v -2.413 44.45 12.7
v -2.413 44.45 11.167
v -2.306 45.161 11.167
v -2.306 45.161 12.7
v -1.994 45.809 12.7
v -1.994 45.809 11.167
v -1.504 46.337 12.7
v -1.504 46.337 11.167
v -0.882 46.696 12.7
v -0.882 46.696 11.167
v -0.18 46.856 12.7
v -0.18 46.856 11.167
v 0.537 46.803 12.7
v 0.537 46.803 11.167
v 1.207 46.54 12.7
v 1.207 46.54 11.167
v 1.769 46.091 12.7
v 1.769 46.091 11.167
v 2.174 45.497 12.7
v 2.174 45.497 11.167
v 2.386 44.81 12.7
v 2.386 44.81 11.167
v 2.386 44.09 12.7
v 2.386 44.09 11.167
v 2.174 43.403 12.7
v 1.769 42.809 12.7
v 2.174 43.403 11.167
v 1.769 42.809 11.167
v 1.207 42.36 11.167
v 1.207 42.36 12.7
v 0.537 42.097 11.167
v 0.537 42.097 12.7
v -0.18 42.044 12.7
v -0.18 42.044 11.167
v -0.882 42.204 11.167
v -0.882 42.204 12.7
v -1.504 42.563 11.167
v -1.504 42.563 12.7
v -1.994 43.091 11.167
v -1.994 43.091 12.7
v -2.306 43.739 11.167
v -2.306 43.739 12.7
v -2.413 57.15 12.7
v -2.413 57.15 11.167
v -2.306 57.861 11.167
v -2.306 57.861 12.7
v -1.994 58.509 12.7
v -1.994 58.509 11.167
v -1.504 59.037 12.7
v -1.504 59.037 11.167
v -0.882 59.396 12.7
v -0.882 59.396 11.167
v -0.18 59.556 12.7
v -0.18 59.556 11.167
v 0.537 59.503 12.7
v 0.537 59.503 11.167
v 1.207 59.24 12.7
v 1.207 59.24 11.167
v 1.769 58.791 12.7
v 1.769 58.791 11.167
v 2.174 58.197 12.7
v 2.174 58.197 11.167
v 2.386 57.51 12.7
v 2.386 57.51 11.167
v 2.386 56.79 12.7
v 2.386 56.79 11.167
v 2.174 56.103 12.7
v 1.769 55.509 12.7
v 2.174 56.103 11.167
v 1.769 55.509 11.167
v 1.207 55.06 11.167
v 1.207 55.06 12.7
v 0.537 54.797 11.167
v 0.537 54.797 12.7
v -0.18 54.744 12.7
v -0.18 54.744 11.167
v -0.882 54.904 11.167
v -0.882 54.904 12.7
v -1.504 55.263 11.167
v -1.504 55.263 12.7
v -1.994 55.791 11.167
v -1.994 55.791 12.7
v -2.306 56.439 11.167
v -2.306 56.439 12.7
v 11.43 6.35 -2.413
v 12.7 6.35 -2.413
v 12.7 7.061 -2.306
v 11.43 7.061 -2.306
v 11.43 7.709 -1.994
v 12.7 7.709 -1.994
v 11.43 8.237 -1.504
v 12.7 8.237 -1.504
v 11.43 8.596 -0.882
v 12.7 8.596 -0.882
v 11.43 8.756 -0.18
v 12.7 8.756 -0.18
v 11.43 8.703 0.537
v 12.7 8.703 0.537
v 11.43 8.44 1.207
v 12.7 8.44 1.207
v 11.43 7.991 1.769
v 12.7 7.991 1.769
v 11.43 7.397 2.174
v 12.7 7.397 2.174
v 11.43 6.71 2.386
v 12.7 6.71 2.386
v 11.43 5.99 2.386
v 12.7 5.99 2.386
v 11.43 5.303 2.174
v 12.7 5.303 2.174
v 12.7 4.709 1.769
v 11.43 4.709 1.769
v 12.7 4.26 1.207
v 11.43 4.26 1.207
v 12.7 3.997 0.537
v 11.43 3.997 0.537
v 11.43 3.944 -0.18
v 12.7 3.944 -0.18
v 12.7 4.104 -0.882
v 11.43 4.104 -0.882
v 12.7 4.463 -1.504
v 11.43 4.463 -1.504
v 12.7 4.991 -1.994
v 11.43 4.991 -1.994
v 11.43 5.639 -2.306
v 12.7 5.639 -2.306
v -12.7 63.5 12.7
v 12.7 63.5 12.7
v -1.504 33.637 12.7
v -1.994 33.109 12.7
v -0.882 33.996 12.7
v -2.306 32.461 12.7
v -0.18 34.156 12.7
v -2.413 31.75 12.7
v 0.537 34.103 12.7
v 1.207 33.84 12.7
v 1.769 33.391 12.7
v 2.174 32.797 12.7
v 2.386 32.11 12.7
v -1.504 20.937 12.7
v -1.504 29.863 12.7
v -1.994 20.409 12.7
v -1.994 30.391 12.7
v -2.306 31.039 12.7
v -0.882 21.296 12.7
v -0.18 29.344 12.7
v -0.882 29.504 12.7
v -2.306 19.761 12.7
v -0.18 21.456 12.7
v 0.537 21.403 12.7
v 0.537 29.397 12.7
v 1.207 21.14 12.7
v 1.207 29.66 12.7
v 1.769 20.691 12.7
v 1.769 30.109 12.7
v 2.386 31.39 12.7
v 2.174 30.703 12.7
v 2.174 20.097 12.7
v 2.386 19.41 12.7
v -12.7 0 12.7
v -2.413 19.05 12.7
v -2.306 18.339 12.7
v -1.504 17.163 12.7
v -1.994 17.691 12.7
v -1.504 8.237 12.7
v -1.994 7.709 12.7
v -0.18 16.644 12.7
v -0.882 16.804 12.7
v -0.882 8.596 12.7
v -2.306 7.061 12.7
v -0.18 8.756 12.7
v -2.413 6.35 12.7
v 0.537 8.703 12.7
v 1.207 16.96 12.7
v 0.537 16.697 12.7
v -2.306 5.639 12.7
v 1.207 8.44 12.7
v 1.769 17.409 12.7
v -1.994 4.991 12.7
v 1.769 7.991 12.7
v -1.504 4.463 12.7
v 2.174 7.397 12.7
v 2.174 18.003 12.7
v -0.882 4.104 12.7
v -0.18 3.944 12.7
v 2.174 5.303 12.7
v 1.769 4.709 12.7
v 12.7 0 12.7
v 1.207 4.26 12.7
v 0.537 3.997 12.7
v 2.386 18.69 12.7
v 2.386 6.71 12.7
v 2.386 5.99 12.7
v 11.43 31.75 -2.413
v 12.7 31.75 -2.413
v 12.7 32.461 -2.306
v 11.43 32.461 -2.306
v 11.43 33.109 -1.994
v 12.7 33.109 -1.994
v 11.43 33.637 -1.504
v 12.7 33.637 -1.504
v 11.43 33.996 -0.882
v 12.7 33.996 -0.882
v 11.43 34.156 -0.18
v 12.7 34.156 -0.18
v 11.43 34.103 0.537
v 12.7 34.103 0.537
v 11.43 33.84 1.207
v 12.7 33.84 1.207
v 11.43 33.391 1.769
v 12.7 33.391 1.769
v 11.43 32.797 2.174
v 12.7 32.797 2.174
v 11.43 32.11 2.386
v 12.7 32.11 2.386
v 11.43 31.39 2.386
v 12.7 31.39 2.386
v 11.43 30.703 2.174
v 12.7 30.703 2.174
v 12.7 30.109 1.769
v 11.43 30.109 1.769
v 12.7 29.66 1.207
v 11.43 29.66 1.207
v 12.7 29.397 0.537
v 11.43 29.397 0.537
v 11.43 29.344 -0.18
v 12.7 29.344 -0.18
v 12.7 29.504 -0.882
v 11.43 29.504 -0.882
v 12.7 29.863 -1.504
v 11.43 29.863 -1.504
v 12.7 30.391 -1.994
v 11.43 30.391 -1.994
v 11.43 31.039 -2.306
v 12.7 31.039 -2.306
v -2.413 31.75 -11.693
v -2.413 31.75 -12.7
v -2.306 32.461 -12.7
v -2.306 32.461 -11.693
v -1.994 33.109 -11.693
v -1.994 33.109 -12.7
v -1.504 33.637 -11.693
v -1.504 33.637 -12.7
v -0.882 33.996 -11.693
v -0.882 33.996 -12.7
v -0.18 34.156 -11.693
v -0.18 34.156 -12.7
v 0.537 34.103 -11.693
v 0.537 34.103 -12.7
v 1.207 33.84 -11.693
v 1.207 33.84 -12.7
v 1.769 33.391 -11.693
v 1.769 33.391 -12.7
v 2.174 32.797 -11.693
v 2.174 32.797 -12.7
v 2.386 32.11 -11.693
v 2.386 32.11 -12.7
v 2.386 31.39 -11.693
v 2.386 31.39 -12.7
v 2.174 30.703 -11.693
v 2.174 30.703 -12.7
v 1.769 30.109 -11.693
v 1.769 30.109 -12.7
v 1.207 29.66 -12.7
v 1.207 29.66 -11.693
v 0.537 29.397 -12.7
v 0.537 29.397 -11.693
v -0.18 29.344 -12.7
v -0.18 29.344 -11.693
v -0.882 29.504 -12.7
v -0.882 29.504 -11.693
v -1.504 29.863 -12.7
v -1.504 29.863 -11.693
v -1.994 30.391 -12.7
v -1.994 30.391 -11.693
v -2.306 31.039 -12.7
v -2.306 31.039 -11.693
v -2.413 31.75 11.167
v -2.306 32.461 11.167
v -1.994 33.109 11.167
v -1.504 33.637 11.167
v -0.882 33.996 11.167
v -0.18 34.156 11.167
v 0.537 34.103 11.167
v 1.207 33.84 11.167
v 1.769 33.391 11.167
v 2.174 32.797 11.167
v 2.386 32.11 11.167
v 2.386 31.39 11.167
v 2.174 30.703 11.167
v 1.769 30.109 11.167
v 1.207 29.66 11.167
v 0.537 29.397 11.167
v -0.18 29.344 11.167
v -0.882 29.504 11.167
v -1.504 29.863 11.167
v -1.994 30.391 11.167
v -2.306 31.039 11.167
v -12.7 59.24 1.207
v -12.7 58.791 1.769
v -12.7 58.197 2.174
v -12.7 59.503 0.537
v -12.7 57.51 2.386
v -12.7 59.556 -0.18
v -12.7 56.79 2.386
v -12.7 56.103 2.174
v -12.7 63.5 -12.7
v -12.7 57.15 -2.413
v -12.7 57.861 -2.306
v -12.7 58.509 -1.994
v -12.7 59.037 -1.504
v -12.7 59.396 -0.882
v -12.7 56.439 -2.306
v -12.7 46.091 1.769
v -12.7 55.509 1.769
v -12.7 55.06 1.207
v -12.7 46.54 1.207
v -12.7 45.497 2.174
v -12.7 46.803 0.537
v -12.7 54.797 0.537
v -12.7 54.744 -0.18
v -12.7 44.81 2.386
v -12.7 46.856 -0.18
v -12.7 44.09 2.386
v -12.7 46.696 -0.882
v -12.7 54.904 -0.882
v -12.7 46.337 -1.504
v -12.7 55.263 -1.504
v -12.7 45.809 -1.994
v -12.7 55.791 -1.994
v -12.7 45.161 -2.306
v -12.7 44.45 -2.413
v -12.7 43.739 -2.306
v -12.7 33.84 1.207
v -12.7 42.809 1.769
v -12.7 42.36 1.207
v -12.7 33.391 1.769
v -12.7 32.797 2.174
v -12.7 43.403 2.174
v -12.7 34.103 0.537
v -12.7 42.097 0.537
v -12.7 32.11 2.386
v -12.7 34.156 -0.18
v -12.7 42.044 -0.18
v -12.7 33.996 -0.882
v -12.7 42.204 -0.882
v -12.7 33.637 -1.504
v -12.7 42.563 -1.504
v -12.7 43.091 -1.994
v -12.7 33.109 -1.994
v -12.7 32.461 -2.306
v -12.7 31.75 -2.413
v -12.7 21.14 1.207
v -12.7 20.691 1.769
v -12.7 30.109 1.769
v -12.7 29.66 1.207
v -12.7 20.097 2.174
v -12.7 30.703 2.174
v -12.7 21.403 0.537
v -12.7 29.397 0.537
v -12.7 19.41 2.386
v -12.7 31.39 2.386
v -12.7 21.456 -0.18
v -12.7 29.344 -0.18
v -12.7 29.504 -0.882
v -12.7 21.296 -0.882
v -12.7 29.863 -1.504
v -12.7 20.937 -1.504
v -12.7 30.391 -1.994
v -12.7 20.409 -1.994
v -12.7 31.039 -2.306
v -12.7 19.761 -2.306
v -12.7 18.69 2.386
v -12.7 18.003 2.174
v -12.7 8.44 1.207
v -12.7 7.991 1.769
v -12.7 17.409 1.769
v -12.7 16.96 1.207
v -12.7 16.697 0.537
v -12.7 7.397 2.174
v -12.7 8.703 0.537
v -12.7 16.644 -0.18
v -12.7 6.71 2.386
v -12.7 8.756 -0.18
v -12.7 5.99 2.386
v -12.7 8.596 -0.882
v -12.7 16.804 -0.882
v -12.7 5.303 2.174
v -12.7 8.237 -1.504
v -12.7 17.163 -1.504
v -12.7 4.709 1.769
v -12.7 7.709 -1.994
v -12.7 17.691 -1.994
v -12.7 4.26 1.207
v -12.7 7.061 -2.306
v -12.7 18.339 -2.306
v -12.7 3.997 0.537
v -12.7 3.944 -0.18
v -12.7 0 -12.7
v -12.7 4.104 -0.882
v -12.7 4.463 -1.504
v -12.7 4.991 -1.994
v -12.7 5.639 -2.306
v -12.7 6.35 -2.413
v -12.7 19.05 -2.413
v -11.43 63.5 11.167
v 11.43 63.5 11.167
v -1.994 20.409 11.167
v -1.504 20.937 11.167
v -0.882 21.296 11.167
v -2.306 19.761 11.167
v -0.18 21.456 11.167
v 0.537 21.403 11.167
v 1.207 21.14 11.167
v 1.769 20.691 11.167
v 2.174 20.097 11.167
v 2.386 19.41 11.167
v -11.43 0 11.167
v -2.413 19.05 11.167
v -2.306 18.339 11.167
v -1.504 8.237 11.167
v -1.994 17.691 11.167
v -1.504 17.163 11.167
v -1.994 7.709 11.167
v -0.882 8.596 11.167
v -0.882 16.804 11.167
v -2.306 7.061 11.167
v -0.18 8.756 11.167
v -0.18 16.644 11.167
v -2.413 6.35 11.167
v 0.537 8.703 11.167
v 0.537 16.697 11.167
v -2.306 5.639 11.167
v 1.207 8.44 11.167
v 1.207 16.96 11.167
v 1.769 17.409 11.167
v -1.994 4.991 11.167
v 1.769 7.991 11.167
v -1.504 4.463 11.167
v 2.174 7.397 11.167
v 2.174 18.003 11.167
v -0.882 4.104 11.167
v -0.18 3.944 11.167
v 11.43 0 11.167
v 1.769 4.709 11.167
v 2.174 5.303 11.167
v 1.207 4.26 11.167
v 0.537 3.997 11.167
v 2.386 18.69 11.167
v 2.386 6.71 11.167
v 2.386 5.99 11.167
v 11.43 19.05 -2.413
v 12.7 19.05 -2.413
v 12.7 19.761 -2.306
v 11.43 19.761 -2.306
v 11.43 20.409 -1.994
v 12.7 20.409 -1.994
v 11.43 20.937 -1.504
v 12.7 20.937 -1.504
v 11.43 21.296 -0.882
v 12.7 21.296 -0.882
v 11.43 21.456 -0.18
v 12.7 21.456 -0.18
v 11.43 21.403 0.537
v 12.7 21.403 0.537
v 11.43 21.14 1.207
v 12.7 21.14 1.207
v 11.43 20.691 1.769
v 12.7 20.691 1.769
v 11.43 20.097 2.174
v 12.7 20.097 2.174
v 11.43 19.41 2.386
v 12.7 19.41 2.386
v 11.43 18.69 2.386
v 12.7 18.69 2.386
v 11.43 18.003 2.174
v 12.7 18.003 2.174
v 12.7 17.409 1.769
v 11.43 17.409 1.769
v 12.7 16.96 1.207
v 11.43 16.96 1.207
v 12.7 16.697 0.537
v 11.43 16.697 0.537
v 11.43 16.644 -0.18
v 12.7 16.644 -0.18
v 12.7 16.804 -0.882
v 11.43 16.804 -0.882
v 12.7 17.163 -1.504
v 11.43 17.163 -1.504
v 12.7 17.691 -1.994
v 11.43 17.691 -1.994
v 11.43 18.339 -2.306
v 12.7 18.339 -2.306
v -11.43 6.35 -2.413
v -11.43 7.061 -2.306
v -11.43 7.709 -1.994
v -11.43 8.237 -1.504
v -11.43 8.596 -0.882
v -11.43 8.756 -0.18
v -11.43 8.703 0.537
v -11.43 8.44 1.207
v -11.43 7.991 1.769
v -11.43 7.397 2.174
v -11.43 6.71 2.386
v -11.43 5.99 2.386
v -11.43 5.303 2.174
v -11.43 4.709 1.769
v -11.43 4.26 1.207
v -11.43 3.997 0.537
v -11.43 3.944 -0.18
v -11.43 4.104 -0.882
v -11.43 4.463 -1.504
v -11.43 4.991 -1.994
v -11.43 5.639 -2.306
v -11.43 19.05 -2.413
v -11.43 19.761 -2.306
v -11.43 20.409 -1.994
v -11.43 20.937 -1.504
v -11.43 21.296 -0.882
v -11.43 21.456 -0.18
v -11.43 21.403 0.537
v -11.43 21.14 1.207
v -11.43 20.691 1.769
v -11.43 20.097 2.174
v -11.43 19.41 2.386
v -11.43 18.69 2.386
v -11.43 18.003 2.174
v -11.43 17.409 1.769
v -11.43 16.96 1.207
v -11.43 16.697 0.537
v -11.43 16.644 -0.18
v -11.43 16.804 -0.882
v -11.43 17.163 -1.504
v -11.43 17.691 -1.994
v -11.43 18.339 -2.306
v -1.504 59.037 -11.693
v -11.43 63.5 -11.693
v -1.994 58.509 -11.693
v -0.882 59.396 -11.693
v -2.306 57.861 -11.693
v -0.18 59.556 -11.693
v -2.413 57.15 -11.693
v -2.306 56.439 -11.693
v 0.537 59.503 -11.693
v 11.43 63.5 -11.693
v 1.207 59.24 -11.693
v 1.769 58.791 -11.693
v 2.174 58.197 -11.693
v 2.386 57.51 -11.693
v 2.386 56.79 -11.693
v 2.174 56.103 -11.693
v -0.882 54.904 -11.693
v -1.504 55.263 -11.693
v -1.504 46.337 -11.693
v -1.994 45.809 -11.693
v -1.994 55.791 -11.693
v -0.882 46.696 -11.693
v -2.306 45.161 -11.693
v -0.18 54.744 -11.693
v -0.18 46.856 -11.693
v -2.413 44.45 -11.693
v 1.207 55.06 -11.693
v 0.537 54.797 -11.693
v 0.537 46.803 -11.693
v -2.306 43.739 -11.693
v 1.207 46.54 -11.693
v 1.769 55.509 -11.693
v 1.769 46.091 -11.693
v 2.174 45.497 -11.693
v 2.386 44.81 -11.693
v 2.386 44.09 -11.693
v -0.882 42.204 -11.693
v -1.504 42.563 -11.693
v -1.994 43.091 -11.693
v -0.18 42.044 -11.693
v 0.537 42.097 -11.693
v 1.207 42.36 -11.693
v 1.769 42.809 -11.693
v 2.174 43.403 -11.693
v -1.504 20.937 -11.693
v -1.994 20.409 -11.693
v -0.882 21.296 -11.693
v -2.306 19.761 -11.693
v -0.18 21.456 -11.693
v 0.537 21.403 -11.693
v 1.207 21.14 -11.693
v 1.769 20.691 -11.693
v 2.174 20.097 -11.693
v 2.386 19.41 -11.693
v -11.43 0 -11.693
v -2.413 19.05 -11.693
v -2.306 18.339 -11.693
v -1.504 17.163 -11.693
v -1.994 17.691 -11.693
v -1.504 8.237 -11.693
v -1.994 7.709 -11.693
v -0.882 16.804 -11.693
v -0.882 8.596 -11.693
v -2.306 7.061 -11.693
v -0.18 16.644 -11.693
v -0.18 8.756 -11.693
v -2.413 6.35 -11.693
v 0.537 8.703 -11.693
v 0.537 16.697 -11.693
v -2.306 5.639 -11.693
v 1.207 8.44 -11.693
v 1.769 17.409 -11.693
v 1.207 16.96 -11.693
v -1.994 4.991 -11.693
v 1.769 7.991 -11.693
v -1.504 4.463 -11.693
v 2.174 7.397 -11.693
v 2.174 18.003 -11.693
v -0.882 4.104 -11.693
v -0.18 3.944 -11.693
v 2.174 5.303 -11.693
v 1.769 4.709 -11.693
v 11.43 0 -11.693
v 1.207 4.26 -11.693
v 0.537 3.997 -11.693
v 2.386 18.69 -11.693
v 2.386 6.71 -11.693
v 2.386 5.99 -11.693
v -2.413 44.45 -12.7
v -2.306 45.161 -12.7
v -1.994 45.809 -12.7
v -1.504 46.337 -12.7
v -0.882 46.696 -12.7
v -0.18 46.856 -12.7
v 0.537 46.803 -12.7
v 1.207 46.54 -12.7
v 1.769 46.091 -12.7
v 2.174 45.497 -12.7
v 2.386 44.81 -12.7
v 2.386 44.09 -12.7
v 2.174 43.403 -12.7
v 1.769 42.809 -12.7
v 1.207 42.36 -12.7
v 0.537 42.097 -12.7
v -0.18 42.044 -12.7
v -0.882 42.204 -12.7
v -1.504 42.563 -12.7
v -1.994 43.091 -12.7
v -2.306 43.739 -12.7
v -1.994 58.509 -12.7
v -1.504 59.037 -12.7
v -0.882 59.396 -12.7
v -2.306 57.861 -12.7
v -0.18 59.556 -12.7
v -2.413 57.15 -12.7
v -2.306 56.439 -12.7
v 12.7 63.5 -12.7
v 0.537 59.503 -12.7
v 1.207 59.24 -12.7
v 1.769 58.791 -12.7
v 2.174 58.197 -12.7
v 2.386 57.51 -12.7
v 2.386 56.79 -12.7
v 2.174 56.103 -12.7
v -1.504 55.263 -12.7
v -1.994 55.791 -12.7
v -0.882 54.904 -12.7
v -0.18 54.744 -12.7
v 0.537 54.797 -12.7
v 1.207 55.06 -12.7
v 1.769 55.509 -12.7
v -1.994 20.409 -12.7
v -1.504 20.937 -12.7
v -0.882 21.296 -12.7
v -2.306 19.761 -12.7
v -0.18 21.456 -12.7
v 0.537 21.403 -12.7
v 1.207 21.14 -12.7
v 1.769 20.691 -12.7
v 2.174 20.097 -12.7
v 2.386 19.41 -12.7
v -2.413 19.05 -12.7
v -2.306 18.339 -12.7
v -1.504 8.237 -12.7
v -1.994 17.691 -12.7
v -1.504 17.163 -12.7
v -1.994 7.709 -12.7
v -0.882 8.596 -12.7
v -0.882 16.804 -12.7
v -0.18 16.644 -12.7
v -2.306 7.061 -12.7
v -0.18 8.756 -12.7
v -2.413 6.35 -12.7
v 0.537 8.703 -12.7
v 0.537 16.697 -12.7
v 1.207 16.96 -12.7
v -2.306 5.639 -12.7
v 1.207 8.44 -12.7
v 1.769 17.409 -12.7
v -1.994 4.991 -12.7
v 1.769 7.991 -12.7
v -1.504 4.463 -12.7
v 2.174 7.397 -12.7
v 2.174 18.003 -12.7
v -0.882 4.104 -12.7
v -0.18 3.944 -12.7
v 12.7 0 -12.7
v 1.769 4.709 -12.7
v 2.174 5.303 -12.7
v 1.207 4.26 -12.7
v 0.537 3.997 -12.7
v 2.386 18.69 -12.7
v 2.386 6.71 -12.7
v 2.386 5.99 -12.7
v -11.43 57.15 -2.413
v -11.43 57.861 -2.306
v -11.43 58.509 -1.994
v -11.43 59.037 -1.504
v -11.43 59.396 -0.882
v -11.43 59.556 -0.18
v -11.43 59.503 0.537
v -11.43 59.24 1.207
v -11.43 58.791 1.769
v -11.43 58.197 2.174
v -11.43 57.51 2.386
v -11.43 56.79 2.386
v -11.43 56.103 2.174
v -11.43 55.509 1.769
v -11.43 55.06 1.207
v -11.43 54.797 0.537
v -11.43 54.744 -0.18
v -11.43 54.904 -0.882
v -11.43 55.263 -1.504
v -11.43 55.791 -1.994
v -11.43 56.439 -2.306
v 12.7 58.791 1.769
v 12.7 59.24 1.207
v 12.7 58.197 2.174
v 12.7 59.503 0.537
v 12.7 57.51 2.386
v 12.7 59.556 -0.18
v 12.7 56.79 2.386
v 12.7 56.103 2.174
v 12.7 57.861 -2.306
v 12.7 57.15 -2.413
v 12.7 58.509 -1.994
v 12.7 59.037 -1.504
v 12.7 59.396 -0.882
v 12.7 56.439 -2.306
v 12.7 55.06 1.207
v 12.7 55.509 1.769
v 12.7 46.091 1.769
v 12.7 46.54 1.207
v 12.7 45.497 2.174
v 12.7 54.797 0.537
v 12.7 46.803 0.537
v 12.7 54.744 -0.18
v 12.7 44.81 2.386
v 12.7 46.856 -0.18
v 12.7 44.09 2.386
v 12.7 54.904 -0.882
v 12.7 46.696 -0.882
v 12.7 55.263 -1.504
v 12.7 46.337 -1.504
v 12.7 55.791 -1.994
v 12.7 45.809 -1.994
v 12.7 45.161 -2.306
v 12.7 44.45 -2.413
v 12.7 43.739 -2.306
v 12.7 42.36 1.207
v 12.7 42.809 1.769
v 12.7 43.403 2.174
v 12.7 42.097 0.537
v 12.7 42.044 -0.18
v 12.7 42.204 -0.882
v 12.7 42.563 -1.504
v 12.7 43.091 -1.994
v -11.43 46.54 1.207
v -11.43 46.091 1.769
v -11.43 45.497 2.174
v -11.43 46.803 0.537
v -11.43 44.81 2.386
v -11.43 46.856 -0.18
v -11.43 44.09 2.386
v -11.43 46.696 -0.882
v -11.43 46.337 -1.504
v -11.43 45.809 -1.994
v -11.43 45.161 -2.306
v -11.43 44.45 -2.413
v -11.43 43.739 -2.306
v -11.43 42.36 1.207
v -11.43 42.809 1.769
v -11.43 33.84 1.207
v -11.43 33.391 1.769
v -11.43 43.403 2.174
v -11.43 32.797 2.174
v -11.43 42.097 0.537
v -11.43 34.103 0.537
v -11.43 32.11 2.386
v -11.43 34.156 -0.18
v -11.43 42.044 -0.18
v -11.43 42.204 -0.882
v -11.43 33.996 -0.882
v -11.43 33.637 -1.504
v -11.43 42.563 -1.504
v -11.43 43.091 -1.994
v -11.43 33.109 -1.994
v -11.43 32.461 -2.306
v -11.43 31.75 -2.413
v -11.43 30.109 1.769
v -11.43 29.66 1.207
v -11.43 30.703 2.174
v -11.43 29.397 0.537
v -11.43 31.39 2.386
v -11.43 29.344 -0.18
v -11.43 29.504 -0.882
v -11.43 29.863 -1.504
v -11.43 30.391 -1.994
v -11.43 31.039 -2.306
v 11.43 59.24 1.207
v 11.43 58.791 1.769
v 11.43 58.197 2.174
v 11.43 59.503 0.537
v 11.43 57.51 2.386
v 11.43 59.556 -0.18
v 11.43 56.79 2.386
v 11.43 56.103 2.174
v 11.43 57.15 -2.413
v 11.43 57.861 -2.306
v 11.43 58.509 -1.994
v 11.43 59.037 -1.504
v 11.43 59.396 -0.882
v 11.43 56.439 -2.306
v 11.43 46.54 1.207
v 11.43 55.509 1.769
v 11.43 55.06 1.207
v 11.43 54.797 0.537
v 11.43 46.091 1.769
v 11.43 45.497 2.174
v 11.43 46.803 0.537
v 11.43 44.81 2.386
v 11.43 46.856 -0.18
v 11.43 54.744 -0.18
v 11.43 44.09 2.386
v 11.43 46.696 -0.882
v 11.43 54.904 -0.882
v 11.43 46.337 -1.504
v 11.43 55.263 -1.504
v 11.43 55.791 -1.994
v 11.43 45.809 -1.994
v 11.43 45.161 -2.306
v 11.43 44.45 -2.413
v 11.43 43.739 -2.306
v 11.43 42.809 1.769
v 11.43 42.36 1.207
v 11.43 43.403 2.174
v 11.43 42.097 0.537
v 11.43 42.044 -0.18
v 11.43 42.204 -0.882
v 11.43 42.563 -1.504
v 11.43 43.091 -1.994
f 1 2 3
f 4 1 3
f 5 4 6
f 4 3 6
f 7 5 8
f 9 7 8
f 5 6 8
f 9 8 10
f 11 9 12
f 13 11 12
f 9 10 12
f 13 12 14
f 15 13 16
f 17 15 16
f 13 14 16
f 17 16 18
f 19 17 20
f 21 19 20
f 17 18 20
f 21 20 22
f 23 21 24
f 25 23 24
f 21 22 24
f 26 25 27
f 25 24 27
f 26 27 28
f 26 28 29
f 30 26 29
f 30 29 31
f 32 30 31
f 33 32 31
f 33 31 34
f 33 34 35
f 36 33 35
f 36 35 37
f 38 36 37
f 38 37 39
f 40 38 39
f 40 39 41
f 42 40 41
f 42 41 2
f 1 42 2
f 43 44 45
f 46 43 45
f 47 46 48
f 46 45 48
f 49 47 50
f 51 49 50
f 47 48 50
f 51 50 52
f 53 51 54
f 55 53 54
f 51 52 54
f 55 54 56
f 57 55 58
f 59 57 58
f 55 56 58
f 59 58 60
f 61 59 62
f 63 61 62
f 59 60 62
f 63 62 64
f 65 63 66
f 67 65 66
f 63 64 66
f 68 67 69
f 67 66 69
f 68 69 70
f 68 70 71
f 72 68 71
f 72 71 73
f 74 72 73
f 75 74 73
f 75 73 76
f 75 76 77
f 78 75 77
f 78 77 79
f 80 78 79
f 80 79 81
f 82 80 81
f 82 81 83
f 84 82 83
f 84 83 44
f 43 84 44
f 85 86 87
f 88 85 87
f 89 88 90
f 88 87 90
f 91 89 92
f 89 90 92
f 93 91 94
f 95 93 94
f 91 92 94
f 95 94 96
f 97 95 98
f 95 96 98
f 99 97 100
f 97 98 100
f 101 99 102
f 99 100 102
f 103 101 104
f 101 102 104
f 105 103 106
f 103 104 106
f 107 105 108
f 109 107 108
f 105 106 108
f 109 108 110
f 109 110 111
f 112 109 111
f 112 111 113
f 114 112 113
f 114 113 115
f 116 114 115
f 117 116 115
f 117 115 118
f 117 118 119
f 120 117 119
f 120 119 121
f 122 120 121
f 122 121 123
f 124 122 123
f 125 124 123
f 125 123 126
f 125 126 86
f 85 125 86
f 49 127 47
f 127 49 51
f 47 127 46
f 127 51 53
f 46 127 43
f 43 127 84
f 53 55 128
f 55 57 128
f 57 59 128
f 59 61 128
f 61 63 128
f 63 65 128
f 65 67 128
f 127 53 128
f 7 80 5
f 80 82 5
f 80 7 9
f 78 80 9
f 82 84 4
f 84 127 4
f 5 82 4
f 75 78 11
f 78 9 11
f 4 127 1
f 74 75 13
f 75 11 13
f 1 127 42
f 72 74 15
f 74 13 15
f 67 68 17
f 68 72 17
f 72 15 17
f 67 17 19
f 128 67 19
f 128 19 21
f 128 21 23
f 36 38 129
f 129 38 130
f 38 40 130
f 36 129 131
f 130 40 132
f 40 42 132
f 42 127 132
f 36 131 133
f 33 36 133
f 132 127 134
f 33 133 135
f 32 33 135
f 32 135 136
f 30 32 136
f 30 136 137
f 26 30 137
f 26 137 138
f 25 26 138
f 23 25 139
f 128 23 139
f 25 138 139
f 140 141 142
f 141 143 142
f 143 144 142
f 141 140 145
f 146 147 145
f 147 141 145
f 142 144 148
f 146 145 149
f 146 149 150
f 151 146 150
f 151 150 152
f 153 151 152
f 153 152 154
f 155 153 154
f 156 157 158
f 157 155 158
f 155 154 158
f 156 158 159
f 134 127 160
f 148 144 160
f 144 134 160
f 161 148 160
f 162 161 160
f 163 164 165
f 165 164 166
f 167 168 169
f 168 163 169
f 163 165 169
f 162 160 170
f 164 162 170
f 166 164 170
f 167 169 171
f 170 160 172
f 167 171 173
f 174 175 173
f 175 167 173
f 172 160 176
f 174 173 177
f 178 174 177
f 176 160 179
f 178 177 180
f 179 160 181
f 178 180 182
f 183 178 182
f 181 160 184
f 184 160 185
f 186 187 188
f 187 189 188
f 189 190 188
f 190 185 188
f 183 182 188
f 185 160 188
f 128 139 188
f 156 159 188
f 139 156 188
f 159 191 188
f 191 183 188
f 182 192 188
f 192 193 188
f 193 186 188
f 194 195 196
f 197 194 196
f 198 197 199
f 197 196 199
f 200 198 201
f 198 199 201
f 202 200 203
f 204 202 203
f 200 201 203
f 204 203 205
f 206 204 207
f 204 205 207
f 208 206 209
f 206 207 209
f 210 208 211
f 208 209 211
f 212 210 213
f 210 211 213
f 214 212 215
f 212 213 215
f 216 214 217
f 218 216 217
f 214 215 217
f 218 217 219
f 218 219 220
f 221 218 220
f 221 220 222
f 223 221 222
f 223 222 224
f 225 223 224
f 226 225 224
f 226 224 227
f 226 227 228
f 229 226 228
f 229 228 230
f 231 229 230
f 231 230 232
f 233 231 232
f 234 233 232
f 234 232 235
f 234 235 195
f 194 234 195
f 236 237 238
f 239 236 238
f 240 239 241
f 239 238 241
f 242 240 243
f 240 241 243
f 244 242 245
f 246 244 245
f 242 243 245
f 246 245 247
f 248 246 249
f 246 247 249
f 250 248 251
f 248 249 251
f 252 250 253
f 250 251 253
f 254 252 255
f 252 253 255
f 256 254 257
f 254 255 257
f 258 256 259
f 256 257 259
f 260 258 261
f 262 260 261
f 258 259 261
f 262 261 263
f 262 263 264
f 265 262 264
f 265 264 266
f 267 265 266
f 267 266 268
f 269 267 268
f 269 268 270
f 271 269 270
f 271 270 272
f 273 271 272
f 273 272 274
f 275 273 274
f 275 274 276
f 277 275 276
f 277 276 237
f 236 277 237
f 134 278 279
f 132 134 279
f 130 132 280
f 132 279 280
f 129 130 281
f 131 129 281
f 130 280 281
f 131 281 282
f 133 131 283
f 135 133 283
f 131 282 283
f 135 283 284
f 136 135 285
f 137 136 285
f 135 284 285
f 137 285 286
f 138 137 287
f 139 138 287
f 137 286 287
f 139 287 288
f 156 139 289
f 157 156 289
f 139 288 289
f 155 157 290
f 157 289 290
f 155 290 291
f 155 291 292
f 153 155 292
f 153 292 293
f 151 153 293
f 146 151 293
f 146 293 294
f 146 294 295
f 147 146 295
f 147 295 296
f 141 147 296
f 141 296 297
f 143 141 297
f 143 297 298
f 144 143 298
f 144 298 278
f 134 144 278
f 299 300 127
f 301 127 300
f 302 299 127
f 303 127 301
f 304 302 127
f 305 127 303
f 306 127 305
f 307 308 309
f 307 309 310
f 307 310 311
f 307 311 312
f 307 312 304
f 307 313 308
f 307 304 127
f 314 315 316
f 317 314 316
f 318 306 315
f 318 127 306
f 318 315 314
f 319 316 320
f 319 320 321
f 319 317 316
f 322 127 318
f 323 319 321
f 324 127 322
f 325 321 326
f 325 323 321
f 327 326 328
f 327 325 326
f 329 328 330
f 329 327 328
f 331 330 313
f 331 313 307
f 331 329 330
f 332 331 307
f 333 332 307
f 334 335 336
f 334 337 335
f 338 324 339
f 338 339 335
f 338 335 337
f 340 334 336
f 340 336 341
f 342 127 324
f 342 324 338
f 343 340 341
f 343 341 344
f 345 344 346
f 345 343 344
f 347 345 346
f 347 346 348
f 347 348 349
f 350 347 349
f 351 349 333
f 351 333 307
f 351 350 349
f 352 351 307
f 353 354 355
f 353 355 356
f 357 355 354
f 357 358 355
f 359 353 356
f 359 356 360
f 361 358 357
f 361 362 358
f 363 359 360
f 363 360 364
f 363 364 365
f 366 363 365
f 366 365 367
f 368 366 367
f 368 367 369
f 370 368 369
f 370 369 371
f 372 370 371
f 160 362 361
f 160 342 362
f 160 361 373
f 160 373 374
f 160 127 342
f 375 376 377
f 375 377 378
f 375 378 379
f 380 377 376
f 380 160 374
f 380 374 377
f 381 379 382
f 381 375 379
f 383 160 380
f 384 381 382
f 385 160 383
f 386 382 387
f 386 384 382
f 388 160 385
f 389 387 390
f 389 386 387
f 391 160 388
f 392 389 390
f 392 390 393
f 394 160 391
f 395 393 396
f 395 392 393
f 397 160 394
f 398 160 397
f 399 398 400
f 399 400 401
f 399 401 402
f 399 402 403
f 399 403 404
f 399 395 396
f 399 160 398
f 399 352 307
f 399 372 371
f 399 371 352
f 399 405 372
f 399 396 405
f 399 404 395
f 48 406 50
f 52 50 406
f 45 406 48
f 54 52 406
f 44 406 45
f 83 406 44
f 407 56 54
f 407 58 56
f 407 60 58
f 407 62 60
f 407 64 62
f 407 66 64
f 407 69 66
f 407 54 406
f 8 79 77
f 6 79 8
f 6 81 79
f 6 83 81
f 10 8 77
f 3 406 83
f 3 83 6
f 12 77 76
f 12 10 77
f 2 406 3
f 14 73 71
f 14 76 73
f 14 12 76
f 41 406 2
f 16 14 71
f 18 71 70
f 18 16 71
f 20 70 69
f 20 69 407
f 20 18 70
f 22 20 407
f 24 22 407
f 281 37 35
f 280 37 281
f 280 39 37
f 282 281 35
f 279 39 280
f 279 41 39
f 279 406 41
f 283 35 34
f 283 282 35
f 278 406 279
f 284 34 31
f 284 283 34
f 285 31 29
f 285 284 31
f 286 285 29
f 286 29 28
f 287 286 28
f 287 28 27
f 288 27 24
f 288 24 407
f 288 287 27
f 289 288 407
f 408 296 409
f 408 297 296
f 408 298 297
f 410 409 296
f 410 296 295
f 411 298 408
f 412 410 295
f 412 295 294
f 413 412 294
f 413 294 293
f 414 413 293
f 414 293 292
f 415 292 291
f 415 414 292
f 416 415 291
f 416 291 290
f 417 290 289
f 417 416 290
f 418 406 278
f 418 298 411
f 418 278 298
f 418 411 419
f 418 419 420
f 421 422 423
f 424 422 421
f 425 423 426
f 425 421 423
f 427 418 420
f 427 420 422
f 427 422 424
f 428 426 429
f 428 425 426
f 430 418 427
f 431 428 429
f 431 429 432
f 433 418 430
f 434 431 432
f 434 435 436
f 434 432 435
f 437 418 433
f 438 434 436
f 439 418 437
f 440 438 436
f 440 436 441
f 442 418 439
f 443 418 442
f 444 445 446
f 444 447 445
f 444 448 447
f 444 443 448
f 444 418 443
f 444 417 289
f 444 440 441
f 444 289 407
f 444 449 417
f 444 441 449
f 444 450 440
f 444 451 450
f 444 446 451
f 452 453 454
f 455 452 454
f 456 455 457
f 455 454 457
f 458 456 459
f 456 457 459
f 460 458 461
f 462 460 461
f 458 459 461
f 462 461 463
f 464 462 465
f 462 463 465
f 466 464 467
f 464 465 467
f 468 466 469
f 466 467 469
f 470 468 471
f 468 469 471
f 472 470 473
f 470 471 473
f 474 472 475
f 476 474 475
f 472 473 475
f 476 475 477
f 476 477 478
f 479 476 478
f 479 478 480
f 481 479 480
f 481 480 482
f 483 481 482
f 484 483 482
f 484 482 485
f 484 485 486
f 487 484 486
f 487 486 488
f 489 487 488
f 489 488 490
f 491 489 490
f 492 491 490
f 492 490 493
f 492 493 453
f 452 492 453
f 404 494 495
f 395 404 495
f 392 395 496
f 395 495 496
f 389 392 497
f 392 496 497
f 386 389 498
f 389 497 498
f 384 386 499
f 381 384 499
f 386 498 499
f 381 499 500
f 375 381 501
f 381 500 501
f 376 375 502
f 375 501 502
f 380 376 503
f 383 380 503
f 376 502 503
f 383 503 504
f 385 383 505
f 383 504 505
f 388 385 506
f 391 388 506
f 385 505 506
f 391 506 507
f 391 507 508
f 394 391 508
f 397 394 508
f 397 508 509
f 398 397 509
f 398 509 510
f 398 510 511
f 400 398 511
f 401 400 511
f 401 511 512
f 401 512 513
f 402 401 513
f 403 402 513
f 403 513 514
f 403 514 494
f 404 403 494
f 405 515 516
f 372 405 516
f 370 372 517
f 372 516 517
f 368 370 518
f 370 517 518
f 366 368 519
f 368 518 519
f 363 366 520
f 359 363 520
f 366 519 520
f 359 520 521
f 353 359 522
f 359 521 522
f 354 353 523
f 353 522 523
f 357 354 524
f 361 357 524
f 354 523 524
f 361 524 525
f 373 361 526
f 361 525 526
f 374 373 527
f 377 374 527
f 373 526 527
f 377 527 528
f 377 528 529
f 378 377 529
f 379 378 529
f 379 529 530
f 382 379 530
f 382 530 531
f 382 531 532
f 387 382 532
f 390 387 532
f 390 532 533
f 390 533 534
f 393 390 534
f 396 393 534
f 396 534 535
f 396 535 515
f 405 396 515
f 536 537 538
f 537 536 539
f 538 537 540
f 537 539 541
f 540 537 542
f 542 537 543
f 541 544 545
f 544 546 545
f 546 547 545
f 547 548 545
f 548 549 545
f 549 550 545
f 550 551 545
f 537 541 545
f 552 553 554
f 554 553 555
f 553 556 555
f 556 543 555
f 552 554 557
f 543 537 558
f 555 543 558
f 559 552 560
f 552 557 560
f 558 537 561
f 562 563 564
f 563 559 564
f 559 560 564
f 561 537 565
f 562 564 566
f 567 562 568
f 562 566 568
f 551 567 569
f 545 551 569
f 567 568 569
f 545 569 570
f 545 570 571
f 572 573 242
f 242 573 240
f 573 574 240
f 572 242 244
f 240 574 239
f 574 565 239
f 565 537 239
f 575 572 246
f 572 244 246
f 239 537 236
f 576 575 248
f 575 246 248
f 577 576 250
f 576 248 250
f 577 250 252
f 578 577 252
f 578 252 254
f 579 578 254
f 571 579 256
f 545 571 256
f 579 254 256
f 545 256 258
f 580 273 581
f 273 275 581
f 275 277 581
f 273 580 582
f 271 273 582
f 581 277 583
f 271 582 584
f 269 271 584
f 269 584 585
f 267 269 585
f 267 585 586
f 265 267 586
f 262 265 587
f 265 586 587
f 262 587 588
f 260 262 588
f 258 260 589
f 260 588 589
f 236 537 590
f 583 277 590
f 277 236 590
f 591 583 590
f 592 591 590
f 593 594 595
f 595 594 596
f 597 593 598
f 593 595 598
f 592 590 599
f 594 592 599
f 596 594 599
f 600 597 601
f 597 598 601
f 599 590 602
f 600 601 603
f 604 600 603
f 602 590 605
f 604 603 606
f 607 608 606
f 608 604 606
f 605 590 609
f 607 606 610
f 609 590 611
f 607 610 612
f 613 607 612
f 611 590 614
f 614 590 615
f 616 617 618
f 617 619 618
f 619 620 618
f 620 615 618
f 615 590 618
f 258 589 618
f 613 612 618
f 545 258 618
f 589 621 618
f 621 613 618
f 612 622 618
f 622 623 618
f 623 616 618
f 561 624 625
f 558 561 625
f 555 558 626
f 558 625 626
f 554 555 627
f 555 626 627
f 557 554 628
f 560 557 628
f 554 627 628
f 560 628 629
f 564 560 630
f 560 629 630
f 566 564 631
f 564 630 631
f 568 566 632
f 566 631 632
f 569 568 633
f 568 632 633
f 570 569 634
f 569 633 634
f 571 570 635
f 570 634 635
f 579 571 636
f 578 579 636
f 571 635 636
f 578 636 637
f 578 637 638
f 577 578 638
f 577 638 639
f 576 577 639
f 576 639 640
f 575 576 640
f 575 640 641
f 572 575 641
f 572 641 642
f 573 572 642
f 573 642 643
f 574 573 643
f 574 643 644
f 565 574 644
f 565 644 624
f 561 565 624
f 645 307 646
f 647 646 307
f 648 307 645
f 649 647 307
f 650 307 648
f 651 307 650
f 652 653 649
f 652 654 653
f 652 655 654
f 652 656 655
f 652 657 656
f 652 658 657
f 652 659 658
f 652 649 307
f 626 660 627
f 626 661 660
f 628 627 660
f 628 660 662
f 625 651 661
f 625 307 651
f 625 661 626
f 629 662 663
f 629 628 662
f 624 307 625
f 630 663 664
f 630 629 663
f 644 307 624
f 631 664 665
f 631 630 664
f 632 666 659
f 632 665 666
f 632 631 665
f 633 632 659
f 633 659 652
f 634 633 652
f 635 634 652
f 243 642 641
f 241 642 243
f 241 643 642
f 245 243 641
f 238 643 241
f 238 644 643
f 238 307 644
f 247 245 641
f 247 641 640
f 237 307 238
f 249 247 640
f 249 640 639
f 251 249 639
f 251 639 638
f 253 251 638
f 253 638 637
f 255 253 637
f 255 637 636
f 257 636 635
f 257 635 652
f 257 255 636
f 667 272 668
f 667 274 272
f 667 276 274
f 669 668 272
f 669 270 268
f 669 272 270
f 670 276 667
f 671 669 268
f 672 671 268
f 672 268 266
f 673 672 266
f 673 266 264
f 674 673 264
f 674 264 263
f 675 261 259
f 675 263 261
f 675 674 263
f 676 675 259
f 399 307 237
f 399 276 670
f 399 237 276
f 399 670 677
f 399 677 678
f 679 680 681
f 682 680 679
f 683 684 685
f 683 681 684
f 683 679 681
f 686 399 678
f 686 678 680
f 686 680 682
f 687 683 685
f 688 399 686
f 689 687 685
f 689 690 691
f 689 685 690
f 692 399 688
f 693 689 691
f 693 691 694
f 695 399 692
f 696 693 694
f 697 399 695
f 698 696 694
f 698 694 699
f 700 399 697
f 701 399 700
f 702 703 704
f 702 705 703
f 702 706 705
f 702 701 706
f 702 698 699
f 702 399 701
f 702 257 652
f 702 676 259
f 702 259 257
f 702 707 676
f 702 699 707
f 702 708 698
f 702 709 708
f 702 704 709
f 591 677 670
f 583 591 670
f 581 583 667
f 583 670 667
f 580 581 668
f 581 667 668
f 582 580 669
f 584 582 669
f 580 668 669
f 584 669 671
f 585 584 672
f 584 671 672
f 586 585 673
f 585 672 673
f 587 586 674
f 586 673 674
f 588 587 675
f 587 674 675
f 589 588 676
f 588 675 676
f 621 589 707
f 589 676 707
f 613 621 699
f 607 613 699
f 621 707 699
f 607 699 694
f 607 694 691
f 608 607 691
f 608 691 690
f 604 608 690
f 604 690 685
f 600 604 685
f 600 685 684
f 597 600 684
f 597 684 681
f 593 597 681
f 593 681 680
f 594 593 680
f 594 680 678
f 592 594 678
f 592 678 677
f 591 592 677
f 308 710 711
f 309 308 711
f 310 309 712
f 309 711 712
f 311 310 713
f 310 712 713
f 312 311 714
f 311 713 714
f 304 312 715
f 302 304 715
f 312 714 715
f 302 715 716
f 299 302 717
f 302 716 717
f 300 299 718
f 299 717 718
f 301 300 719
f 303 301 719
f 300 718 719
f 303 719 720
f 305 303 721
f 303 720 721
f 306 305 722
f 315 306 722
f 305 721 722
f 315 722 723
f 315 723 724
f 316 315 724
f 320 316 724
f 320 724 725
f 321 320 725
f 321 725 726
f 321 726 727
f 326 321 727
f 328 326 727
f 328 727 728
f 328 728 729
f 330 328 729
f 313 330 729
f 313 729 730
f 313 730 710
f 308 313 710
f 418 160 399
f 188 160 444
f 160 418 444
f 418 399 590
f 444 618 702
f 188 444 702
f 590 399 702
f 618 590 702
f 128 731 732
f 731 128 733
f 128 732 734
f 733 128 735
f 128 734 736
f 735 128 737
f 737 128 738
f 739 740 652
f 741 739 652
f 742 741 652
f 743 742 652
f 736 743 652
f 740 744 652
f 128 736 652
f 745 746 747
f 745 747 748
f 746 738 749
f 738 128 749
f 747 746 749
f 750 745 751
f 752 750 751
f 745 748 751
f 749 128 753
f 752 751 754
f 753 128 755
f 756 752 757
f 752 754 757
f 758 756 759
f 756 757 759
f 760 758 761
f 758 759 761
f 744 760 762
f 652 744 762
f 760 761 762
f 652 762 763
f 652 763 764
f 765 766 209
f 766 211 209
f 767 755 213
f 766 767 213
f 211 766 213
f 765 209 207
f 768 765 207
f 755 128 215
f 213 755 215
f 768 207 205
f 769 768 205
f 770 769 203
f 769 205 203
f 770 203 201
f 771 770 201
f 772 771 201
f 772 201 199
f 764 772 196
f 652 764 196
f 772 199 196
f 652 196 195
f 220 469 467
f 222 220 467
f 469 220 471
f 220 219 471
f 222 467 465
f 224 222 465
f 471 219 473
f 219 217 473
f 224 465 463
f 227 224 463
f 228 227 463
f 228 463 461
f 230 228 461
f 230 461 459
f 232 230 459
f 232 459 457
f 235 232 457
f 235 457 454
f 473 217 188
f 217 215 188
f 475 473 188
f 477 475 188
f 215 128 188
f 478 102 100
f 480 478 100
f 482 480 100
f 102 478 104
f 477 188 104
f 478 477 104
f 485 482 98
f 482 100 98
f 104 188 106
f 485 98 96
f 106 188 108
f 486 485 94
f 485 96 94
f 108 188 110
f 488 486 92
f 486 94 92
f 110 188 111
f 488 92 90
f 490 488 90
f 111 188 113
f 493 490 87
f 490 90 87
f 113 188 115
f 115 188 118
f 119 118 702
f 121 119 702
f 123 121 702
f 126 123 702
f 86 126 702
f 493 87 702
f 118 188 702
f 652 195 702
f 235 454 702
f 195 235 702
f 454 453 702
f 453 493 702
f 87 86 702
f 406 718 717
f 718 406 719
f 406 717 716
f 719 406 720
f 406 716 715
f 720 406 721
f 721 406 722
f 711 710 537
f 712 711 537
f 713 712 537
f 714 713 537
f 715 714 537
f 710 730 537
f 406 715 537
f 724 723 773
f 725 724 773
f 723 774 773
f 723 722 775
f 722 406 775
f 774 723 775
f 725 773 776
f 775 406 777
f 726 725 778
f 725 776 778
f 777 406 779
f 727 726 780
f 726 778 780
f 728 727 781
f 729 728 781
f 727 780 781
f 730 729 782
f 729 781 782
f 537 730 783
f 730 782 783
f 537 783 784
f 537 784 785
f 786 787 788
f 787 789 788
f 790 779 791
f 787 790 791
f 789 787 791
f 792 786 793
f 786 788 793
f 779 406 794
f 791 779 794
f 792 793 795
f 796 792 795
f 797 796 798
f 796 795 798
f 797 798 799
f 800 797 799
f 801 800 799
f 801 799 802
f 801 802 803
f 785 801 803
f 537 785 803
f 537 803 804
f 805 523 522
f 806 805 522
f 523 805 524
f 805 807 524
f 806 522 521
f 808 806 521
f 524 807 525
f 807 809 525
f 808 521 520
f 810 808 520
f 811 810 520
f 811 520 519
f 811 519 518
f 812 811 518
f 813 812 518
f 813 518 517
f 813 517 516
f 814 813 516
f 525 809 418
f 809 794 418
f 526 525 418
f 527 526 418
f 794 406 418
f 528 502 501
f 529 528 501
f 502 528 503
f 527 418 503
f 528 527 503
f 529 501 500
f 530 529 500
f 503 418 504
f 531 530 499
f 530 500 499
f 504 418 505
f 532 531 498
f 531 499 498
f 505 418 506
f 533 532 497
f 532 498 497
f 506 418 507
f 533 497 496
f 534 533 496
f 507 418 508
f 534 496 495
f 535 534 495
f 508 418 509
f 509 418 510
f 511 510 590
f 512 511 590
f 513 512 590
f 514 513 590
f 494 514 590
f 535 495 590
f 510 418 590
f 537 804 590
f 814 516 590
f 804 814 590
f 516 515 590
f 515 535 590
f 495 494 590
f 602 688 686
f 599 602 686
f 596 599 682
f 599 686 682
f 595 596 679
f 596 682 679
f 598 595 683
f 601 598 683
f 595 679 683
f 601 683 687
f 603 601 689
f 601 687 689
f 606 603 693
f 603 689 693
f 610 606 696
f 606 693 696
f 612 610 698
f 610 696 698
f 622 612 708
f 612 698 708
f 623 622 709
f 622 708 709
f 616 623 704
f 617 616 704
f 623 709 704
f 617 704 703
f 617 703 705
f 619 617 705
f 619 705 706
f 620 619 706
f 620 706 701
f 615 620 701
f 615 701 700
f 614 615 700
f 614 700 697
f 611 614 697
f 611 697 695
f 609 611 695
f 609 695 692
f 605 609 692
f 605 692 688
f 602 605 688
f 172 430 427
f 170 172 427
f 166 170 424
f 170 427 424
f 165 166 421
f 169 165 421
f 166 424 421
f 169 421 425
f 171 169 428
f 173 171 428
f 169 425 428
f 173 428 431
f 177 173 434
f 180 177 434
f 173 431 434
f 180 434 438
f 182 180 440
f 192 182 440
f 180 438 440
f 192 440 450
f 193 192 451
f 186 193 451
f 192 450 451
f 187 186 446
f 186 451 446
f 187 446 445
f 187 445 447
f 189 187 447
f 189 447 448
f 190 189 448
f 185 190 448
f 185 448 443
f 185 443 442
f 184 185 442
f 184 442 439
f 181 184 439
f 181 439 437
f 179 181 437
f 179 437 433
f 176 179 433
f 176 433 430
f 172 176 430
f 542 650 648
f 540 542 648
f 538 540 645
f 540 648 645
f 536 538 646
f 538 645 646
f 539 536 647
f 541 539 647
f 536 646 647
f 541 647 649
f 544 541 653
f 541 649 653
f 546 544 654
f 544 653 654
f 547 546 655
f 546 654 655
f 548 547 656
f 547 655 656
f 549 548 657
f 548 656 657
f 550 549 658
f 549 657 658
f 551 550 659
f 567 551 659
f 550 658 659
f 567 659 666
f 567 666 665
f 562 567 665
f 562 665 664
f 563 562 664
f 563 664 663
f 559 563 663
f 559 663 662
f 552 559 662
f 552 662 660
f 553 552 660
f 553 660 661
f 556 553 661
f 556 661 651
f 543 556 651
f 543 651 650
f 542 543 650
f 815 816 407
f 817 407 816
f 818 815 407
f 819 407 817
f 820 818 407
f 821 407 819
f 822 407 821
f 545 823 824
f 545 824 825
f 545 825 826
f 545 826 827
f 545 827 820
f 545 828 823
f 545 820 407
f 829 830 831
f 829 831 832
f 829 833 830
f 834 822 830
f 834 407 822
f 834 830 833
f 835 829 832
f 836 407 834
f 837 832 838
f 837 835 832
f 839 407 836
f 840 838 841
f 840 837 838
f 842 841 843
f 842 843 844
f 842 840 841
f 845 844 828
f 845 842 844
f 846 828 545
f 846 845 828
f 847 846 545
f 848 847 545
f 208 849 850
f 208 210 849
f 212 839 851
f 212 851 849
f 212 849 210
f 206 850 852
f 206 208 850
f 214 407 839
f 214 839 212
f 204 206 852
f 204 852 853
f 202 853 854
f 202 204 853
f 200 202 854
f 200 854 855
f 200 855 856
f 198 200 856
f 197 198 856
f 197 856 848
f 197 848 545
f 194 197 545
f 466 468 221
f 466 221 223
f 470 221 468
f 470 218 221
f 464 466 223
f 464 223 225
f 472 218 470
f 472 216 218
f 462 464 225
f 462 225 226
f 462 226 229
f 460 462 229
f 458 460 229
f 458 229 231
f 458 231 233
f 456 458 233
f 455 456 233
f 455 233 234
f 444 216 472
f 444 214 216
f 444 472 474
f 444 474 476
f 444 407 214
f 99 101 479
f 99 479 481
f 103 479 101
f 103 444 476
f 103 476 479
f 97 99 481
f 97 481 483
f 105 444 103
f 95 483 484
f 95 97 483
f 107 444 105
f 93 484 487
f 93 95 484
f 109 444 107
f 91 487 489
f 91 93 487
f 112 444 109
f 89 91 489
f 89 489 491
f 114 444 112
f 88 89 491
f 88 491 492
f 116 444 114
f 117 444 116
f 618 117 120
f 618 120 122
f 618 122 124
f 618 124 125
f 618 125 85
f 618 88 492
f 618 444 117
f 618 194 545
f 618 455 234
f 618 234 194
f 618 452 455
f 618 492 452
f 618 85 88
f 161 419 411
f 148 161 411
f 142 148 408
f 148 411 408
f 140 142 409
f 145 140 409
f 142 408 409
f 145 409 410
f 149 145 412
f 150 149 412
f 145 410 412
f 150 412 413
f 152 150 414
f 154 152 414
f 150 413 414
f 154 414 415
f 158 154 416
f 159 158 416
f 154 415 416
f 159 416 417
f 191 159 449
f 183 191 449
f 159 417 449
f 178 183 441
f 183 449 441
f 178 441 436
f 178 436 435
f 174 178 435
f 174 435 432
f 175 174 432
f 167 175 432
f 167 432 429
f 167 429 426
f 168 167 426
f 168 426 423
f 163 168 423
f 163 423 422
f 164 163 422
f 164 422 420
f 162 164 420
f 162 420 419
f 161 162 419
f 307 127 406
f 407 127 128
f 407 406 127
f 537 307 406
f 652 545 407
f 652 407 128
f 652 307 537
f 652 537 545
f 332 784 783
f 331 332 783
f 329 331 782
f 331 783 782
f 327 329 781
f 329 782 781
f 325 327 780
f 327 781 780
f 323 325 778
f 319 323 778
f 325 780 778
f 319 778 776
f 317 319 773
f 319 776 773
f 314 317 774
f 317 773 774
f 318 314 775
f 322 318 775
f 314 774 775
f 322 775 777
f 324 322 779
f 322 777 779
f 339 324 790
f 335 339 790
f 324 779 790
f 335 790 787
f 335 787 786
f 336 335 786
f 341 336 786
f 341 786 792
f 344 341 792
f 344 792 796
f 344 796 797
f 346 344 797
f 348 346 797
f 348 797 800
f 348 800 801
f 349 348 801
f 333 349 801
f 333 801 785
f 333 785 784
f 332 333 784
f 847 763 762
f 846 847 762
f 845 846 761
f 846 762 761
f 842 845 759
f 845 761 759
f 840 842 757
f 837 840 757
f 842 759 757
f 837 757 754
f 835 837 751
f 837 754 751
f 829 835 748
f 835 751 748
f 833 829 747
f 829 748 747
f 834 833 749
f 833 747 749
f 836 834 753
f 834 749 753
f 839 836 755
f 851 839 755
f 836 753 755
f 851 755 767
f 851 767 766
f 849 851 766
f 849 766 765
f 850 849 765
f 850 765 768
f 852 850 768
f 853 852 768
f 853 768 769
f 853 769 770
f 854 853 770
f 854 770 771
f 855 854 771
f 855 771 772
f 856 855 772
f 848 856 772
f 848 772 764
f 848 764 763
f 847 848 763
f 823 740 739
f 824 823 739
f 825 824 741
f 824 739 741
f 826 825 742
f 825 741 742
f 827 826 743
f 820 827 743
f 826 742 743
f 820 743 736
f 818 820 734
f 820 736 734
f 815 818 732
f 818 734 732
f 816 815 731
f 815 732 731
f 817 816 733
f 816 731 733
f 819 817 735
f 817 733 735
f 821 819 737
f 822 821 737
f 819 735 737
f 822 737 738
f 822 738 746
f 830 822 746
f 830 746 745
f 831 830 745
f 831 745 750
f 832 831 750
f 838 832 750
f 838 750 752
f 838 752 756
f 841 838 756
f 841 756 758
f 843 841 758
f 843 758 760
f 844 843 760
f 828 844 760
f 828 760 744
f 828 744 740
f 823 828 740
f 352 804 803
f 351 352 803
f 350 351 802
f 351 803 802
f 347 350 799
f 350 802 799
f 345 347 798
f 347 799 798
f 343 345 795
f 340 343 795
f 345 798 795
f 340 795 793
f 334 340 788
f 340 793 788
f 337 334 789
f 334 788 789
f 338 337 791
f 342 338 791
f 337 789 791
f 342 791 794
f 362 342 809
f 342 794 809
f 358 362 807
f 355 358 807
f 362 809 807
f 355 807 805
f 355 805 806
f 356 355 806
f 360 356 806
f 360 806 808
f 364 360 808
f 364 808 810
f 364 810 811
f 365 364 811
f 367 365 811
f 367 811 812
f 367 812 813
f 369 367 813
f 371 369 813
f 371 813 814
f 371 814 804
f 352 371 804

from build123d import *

# Parameters (mm, degrees)
SKETCH2_W           = 25.4
SKETCH2_H           = 25.4
SKETCH2_W_2         = 22.86
SKETCH2_H_2         = 22.86
BOSS_EXTRUDE1_DEPTH = 63.5
SKETCH3_R           = 2.413
CUT_EXTRUDE1_DEPTH  = 70.560764803
SKETCH4_R           = 2.413
CUT_EXTRUDE2_DEPTH  = 70.560764803


with BuildPart() as part:
    # Sketch2 → Boss-Extrude1 (new body)
    with BuildSketch(Plane(origin=(0, 0, 0), x_dir=(1, 0, 0), z_dir=(0, 1, 0))):
        Rectangle(SKETCH2_W, SKETCH2_H)
        with Locations((0, 0.262548077)):
            Rectangle(SKETCH2_W_2, SKETCH2_H_2, mode=Mode.SUBTRACT)
    extrude(amount=BOSS_EXTRUDE1_DEPTH)

    # Sketch3 → Cut-Extrude1 (cut, through all)
    with BuildSketch(Plane(origin=(0, 0, -12.7), x_dir=(-1, 0, 0), z_dir=(0, 0, -1))):
        with Locations((0, 57.15)):
            Circle(SKETCH3_R)
        with Locations((0, 44.45)):
            Circle(SKETCH3_R)
        with Locations((0, 31.75)):
            Circle(SKETCH3_R)
        with Locations((0, 19.05)):
            Circle(SKETCH3_R)
        with Locations((0, 6.35)):
            Circle(SKETCH3_R)
        with Locations((0, -6.35)):
            Circle(SKETCH3_R)
    extrude(amount=-CUT_EXTRUDE1_DEPTH, mode=Mode.SUBTRACT)

    # Sketch4 → Cut-Extrude2 (cut, through all)
    with BuildSketch(Plane(origin=(12.7, 0, 0), x_dir=(0, 0, -1), z_dir=(1, 0, 0))):
        with Locations((0, 57.15)):
            Circle(SKETCH4_R)
        with Locations((0, 44.45)):
            Circle(SKETCH4_R)
        with Locations((0, 31.75)):
            Circle(SKETCH4_R)
        with Locations((0, 19.05)):
            Circle(SKETCH4_R)
        with Locations((0, 6.35)):
            Circle(SKETCH4_R)
        with Locations((0, -6.35)):
            Circle(SKETCH4_R)
    extrude(amount=-CUT_EXTRUDE2_DEPTH, mode=Mode.SUBTRACT)


solid = part.part
